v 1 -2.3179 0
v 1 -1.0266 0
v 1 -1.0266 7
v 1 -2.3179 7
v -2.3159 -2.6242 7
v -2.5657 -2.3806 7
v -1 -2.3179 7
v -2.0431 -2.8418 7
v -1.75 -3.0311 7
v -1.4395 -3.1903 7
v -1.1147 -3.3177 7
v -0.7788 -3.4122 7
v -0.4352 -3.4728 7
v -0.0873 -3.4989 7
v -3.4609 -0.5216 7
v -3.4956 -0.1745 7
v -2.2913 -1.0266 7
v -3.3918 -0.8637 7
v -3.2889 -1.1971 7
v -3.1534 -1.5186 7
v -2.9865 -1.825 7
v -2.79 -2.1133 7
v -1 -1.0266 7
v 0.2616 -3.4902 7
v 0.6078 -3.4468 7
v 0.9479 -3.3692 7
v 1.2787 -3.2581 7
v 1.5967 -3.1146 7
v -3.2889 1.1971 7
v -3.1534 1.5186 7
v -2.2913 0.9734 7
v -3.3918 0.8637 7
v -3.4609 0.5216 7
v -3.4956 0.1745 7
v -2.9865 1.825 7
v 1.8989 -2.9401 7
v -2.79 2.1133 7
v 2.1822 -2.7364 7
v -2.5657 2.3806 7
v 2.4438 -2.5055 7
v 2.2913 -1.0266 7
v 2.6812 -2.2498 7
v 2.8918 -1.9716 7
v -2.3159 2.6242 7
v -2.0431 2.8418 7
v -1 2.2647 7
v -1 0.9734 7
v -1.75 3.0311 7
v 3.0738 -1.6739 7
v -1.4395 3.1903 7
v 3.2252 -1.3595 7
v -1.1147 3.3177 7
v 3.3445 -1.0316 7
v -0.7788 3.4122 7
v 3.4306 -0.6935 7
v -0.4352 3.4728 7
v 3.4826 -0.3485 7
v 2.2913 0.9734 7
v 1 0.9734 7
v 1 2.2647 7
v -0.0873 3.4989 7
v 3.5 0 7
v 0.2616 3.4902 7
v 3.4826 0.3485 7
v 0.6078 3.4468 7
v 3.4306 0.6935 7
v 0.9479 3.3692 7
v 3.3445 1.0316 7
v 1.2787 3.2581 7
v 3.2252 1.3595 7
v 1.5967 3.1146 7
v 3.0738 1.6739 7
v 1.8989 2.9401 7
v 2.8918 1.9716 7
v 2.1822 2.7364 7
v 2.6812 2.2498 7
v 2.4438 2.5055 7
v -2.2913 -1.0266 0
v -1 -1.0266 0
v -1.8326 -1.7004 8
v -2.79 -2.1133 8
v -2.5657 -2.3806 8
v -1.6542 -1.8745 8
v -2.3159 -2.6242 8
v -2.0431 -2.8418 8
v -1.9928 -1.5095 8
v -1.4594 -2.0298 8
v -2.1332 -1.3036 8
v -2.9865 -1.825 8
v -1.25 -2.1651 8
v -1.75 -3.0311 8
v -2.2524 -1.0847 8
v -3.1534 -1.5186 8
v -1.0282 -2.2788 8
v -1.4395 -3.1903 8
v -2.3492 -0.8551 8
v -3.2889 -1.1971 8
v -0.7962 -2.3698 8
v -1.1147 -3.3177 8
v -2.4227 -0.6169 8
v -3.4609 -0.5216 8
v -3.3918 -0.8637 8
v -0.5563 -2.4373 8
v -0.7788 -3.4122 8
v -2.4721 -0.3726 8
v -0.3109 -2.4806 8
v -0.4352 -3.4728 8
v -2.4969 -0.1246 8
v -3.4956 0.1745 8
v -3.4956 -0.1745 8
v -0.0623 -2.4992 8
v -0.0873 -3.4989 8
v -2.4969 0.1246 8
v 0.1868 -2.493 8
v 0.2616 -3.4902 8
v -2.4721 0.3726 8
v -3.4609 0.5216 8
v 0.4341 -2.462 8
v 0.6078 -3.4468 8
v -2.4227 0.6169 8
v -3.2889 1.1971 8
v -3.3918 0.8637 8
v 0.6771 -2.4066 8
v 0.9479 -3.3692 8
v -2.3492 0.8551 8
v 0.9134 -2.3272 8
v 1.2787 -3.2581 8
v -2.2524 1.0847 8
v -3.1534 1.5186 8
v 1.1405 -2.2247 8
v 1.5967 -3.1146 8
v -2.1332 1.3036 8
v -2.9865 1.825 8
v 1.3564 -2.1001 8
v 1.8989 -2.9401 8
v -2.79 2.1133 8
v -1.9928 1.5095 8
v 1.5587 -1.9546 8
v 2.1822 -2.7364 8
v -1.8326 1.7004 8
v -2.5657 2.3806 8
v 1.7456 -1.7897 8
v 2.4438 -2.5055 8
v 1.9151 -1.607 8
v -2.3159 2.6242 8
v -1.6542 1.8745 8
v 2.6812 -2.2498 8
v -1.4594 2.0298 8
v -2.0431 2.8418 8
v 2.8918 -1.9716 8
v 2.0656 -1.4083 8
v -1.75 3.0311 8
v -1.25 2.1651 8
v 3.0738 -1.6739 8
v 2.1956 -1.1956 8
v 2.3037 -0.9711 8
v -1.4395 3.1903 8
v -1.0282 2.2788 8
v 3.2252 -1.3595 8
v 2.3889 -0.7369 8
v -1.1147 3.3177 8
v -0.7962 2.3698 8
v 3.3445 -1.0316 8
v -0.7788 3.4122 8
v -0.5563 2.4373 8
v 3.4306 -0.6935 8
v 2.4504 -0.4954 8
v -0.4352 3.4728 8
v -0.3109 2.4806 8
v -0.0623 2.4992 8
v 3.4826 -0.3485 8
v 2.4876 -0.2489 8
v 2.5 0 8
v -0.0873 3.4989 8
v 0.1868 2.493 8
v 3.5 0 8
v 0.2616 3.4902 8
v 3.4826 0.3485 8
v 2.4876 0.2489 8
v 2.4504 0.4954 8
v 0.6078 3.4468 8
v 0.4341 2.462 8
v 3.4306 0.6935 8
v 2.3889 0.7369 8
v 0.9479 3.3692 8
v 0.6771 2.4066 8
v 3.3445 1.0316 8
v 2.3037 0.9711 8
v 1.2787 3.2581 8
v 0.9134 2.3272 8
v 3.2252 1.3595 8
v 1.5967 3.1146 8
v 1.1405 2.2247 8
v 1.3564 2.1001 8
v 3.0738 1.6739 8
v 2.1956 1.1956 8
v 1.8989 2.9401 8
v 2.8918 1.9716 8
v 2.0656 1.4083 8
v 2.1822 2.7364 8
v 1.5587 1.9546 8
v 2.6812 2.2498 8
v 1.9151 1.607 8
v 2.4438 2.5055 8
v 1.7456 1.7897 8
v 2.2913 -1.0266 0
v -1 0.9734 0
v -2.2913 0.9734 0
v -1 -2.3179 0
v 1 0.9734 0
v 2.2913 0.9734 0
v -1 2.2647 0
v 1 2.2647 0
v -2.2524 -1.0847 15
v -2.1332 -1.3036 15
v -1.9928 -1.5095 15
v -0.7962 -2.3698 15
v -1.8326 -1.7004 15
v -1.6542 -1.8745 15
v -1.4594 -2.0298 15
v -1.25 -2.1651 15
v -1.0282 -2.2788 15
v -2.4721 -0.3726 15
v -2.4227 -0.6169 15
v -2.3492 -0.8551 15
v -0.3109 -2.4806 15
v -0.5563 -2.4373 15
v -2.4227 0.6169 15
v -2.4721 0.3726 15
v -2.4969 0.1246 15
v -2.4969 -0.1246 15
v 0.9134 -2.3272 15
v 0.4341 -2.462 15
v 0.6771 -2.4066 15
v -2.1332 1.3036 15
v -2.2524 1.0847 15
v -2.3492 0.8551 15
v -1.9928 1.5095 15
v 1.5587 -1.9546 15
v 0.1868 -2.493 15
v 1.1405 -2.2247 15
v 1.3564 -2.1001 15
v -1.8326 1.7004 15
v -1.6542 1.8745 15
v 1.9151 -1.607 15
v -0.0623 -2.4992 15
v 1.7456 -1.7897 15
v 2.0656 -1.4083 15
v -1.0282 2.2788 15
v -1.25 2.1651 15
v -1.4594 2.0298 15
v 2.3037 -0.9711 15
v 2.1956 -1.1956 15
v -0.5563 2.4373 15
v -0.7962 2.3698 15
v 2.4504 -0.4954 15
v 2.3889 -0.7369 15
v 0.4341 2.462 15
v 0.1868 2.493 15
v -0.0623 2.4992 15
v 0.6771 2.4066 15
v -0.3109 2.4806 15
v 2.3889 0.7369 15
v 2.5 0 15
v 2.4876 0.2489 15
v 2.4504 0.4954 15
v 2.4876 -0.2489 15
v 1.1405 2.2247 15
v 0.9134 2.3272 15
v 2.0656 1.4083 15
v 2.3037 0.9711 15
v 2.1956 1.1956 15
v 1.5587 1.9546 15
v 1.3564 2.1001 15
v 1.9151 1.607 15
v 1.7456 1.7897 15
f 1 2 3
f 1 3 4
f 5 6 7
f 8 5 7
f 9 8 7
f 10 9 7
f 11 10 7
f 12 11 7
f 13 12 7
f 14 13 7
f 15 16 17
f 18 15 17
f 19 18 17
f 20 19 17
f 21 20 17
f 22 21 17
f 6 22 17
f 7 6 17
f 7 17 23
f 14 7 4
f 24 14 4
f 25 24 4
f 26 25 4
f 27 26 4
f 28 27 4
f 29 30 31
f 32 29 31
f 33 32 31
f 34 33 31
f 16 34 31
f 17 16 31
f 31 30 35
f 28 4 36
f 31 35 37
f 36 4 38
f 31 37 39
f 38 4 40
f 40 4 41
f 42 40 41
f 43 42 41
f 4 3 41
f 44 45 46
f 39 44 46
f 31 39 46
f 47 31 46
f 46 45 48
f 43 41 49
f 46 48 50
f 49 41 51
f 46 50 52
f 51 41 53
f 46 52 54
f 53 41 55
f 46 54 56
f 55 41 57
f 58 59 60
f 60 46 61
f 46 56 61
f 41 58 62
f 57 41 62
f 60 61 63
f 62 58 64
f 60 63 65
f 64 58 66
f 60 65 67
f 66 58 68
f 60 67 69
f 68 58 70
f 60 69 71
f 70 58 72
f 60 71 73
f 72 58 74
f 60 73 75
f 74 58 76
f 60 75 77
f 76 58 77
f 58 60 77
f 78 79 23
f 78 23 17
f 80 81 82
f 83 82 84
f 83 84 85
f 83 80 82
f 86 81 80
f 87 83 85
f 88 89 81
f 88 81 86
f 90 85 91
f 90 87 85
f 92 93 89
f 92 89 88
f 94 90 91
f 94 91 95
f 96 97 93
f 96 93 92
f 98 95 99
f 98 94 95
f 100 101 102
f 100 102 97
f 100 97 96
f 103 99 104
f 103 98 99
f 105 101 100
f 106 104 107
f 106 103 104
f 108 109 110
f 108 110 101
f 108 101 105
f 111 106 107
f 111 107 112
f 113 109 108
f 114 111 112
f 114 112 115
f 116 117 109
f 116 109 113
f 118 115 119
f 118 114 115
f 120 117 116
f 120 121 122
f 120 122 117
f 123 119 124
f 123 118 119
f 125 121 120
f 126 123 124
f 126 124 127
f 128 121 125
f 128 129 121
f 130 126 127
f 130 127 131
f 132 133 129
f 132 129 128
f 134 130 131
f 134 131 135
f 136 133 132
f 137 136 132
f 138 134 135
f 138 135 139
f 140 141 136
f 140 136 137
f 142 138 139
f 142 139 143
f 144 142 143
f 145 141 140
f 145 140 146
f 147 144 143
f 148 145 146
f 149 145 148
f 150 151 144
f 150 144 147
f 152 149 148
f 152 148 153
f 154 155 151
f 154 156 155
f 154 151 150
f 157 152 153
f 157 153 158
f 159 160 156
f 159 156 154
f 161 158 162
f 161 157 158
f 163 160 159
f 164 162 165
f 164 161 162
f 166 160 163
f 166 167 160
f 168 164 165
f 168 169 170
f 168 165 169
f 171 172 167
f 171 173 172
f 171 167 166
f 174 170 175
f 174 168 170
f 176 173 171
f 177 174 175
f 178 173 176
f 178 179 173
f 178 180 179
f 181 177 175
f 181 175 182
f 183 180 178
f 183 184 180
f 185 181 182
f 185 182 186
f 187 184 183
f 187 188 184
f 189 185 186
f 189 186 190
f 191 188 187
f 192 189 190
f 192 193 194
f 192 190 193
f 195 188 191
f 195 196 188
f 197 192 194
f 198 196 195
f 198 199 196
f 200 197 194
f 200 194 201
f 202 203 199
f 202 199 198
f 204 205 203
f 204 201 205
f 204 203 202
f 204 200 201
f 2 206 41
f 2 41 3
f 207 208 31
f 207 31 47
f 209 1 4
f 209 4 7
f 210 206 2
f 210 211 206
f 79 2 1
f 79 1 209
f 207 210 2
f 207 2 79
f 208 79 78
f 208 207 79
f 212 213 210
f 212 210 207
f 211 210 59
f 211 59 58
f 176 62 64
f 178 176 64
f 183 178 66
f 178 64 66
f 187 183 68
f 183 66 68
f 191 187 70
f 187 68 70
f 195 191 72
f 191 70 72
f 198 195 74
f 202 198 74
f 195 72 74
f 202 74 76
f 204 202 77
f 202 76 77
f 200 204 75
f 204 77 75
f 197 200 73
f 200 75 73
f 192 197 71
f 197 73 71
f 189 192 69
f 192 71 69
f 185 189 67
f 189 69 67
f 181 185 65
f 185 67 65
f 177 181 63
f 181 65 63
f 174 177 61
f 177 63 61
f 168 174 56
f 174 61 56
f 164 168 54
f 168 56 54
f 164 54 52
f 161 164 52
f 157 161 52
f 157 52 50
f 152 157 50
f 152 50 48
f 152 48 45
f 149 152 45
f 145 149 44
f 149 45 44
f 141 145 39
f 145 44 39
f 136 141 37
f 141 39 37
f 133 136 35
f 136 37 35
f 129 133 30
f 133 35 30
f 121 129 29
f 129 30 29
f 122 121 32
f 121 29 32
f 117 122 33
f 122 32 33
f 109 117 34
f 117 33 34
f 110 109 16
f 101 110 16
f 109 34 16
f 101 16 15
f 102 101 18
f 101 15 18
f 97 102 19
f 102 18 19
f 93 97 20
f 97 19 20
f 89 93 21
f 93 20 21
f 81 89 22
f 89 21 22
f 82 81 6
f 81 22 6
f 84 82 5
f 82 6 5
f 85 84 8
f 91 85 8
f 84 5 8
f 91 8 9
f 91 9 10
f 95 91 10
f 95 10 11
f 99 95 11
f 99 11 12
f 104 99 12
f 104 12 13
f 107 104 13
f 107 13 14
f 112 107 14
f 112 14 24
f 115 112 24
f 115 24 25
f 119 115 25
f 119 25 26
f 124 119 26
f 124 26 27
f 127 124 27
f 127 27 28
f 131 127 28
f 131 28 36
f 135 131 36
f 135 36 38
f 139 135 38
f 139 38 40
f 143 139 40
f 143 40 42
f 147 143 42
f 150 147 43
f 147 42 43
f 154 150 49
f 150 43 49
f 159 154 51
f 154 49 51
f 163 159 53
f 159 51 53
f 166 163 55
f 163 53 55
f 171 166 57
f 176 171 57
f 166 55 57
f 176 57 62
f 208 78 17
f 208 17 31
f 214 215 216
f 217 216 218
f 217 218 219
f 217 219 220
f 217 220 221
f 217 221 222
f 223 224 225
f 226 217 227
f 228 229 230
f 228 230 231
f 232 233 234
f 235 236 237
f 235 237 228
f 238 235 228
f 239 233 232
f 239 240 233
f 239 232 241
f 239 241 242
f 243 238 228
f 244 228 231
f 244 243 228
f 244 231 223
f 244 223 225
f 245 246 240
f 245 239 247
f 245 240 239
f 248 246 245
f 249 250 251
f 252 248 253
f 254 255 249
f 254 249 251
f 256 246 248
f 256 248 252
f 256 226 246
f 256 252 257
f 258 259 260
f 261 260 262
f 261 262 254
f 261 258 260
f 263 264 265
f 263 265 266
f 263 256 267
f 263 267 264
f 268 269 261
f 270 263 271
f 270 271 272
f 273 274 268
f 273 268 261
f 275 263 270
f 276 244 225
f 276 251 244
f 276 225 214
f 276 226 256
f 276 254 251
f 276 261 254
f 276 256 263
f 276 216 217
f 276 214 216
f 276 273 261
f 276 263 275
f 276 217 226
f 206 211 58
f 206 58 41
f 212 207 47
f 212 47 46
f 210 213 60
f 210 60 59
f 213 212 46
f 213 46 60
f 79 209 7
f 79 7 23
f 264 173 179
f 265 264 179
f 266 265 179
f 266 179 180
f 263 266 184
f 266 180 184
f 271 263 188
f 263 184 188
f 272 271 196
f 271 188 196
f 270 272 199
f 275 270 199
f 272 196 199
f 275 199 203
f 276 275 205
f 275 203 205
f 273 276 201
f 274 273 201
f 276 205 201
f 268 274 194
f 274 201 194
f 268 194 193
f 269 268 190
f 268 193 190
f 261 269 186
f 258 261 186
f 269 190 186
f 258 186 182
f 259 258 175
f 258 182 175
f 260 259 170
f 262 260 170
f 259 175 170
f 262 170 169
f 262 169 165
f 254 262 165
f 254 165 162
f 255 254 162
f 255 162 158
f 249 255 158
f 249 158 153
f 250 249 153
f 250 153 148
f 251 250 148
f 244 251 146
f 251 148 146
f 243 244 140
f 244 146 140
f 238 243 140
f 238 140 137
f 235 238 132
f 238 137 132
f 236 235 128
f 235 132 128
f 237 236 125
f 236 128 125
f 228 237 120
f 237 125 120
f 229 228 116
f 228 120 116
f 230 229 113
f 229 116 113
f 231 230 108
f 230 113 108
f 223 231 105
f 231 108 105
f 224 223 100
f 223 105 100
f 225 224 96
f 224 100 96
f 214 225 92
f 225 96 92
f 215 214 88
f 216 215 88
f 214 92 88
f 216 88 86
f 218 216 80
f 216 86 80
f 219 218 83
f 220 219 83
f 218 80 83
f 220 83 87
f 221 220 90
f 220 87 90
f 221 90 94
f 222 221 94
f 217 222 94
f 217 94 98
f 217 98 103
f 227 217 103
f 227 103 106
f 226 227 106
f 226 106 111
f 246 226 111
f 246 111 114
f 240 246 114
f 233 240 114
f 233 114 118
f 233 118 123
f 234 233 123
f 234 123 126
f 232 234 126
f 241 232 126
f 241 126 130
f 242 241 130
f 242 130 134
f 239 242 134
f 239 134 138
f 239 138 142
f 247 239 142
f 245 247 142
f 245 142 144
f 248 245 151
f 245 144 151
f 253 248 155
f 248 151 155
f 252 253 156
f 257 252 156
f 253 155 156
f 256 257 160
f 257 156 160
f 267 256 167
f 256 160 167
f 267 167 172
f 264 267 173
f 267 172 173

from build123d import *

# Parameters (mm, degrees)
BOSS_EXTRUDE1_DEPTH = 7
SKETCH2_R           = 3.5
BOSS_EXTRUDE2_DEPTH = 1
SKETCH3_R           = 2.5
BOSS_EXTRUDE3_DEPTH = 7


with BuildPart() as part:
    # Sketch1 → Boss-Extrude1 (new body)
    with BuildSketch(Plane.XY):
        Polygon((2.291287847, -1.026567818), (1, -1.026567818), (1, -2.317855665), (-1, -2.317855665), (-1, -1.026567818), (-2.291287847, -1.026567818), (-2.291287847, 0.973432182), (-1, 0.973432182), (-1, 2.26472003), (1, 2.26472003), (1, 0.973432182), (2.291287847, 0.973432182), align=None)
    extrude(amount=BOSS_EXTRUDE1_DEPTH)

    # Sketch2 → Boss-Extrude2 (add)
    with BuildSketch(Plane.XY.offset(7)):
        Circle(SKETCH2_R)
    extrude(amount=BOSS_EXTRUDE2_DEPTH)

    # Sketch3 → Boss-Extrude3 (add)
    with BuildSketch(Plane.XY.offset(8)):
        Circle(SKETCH3_R)
    extrude(amount=BOSS_EXTRUDE3_DEPTH)


solid = part.part
